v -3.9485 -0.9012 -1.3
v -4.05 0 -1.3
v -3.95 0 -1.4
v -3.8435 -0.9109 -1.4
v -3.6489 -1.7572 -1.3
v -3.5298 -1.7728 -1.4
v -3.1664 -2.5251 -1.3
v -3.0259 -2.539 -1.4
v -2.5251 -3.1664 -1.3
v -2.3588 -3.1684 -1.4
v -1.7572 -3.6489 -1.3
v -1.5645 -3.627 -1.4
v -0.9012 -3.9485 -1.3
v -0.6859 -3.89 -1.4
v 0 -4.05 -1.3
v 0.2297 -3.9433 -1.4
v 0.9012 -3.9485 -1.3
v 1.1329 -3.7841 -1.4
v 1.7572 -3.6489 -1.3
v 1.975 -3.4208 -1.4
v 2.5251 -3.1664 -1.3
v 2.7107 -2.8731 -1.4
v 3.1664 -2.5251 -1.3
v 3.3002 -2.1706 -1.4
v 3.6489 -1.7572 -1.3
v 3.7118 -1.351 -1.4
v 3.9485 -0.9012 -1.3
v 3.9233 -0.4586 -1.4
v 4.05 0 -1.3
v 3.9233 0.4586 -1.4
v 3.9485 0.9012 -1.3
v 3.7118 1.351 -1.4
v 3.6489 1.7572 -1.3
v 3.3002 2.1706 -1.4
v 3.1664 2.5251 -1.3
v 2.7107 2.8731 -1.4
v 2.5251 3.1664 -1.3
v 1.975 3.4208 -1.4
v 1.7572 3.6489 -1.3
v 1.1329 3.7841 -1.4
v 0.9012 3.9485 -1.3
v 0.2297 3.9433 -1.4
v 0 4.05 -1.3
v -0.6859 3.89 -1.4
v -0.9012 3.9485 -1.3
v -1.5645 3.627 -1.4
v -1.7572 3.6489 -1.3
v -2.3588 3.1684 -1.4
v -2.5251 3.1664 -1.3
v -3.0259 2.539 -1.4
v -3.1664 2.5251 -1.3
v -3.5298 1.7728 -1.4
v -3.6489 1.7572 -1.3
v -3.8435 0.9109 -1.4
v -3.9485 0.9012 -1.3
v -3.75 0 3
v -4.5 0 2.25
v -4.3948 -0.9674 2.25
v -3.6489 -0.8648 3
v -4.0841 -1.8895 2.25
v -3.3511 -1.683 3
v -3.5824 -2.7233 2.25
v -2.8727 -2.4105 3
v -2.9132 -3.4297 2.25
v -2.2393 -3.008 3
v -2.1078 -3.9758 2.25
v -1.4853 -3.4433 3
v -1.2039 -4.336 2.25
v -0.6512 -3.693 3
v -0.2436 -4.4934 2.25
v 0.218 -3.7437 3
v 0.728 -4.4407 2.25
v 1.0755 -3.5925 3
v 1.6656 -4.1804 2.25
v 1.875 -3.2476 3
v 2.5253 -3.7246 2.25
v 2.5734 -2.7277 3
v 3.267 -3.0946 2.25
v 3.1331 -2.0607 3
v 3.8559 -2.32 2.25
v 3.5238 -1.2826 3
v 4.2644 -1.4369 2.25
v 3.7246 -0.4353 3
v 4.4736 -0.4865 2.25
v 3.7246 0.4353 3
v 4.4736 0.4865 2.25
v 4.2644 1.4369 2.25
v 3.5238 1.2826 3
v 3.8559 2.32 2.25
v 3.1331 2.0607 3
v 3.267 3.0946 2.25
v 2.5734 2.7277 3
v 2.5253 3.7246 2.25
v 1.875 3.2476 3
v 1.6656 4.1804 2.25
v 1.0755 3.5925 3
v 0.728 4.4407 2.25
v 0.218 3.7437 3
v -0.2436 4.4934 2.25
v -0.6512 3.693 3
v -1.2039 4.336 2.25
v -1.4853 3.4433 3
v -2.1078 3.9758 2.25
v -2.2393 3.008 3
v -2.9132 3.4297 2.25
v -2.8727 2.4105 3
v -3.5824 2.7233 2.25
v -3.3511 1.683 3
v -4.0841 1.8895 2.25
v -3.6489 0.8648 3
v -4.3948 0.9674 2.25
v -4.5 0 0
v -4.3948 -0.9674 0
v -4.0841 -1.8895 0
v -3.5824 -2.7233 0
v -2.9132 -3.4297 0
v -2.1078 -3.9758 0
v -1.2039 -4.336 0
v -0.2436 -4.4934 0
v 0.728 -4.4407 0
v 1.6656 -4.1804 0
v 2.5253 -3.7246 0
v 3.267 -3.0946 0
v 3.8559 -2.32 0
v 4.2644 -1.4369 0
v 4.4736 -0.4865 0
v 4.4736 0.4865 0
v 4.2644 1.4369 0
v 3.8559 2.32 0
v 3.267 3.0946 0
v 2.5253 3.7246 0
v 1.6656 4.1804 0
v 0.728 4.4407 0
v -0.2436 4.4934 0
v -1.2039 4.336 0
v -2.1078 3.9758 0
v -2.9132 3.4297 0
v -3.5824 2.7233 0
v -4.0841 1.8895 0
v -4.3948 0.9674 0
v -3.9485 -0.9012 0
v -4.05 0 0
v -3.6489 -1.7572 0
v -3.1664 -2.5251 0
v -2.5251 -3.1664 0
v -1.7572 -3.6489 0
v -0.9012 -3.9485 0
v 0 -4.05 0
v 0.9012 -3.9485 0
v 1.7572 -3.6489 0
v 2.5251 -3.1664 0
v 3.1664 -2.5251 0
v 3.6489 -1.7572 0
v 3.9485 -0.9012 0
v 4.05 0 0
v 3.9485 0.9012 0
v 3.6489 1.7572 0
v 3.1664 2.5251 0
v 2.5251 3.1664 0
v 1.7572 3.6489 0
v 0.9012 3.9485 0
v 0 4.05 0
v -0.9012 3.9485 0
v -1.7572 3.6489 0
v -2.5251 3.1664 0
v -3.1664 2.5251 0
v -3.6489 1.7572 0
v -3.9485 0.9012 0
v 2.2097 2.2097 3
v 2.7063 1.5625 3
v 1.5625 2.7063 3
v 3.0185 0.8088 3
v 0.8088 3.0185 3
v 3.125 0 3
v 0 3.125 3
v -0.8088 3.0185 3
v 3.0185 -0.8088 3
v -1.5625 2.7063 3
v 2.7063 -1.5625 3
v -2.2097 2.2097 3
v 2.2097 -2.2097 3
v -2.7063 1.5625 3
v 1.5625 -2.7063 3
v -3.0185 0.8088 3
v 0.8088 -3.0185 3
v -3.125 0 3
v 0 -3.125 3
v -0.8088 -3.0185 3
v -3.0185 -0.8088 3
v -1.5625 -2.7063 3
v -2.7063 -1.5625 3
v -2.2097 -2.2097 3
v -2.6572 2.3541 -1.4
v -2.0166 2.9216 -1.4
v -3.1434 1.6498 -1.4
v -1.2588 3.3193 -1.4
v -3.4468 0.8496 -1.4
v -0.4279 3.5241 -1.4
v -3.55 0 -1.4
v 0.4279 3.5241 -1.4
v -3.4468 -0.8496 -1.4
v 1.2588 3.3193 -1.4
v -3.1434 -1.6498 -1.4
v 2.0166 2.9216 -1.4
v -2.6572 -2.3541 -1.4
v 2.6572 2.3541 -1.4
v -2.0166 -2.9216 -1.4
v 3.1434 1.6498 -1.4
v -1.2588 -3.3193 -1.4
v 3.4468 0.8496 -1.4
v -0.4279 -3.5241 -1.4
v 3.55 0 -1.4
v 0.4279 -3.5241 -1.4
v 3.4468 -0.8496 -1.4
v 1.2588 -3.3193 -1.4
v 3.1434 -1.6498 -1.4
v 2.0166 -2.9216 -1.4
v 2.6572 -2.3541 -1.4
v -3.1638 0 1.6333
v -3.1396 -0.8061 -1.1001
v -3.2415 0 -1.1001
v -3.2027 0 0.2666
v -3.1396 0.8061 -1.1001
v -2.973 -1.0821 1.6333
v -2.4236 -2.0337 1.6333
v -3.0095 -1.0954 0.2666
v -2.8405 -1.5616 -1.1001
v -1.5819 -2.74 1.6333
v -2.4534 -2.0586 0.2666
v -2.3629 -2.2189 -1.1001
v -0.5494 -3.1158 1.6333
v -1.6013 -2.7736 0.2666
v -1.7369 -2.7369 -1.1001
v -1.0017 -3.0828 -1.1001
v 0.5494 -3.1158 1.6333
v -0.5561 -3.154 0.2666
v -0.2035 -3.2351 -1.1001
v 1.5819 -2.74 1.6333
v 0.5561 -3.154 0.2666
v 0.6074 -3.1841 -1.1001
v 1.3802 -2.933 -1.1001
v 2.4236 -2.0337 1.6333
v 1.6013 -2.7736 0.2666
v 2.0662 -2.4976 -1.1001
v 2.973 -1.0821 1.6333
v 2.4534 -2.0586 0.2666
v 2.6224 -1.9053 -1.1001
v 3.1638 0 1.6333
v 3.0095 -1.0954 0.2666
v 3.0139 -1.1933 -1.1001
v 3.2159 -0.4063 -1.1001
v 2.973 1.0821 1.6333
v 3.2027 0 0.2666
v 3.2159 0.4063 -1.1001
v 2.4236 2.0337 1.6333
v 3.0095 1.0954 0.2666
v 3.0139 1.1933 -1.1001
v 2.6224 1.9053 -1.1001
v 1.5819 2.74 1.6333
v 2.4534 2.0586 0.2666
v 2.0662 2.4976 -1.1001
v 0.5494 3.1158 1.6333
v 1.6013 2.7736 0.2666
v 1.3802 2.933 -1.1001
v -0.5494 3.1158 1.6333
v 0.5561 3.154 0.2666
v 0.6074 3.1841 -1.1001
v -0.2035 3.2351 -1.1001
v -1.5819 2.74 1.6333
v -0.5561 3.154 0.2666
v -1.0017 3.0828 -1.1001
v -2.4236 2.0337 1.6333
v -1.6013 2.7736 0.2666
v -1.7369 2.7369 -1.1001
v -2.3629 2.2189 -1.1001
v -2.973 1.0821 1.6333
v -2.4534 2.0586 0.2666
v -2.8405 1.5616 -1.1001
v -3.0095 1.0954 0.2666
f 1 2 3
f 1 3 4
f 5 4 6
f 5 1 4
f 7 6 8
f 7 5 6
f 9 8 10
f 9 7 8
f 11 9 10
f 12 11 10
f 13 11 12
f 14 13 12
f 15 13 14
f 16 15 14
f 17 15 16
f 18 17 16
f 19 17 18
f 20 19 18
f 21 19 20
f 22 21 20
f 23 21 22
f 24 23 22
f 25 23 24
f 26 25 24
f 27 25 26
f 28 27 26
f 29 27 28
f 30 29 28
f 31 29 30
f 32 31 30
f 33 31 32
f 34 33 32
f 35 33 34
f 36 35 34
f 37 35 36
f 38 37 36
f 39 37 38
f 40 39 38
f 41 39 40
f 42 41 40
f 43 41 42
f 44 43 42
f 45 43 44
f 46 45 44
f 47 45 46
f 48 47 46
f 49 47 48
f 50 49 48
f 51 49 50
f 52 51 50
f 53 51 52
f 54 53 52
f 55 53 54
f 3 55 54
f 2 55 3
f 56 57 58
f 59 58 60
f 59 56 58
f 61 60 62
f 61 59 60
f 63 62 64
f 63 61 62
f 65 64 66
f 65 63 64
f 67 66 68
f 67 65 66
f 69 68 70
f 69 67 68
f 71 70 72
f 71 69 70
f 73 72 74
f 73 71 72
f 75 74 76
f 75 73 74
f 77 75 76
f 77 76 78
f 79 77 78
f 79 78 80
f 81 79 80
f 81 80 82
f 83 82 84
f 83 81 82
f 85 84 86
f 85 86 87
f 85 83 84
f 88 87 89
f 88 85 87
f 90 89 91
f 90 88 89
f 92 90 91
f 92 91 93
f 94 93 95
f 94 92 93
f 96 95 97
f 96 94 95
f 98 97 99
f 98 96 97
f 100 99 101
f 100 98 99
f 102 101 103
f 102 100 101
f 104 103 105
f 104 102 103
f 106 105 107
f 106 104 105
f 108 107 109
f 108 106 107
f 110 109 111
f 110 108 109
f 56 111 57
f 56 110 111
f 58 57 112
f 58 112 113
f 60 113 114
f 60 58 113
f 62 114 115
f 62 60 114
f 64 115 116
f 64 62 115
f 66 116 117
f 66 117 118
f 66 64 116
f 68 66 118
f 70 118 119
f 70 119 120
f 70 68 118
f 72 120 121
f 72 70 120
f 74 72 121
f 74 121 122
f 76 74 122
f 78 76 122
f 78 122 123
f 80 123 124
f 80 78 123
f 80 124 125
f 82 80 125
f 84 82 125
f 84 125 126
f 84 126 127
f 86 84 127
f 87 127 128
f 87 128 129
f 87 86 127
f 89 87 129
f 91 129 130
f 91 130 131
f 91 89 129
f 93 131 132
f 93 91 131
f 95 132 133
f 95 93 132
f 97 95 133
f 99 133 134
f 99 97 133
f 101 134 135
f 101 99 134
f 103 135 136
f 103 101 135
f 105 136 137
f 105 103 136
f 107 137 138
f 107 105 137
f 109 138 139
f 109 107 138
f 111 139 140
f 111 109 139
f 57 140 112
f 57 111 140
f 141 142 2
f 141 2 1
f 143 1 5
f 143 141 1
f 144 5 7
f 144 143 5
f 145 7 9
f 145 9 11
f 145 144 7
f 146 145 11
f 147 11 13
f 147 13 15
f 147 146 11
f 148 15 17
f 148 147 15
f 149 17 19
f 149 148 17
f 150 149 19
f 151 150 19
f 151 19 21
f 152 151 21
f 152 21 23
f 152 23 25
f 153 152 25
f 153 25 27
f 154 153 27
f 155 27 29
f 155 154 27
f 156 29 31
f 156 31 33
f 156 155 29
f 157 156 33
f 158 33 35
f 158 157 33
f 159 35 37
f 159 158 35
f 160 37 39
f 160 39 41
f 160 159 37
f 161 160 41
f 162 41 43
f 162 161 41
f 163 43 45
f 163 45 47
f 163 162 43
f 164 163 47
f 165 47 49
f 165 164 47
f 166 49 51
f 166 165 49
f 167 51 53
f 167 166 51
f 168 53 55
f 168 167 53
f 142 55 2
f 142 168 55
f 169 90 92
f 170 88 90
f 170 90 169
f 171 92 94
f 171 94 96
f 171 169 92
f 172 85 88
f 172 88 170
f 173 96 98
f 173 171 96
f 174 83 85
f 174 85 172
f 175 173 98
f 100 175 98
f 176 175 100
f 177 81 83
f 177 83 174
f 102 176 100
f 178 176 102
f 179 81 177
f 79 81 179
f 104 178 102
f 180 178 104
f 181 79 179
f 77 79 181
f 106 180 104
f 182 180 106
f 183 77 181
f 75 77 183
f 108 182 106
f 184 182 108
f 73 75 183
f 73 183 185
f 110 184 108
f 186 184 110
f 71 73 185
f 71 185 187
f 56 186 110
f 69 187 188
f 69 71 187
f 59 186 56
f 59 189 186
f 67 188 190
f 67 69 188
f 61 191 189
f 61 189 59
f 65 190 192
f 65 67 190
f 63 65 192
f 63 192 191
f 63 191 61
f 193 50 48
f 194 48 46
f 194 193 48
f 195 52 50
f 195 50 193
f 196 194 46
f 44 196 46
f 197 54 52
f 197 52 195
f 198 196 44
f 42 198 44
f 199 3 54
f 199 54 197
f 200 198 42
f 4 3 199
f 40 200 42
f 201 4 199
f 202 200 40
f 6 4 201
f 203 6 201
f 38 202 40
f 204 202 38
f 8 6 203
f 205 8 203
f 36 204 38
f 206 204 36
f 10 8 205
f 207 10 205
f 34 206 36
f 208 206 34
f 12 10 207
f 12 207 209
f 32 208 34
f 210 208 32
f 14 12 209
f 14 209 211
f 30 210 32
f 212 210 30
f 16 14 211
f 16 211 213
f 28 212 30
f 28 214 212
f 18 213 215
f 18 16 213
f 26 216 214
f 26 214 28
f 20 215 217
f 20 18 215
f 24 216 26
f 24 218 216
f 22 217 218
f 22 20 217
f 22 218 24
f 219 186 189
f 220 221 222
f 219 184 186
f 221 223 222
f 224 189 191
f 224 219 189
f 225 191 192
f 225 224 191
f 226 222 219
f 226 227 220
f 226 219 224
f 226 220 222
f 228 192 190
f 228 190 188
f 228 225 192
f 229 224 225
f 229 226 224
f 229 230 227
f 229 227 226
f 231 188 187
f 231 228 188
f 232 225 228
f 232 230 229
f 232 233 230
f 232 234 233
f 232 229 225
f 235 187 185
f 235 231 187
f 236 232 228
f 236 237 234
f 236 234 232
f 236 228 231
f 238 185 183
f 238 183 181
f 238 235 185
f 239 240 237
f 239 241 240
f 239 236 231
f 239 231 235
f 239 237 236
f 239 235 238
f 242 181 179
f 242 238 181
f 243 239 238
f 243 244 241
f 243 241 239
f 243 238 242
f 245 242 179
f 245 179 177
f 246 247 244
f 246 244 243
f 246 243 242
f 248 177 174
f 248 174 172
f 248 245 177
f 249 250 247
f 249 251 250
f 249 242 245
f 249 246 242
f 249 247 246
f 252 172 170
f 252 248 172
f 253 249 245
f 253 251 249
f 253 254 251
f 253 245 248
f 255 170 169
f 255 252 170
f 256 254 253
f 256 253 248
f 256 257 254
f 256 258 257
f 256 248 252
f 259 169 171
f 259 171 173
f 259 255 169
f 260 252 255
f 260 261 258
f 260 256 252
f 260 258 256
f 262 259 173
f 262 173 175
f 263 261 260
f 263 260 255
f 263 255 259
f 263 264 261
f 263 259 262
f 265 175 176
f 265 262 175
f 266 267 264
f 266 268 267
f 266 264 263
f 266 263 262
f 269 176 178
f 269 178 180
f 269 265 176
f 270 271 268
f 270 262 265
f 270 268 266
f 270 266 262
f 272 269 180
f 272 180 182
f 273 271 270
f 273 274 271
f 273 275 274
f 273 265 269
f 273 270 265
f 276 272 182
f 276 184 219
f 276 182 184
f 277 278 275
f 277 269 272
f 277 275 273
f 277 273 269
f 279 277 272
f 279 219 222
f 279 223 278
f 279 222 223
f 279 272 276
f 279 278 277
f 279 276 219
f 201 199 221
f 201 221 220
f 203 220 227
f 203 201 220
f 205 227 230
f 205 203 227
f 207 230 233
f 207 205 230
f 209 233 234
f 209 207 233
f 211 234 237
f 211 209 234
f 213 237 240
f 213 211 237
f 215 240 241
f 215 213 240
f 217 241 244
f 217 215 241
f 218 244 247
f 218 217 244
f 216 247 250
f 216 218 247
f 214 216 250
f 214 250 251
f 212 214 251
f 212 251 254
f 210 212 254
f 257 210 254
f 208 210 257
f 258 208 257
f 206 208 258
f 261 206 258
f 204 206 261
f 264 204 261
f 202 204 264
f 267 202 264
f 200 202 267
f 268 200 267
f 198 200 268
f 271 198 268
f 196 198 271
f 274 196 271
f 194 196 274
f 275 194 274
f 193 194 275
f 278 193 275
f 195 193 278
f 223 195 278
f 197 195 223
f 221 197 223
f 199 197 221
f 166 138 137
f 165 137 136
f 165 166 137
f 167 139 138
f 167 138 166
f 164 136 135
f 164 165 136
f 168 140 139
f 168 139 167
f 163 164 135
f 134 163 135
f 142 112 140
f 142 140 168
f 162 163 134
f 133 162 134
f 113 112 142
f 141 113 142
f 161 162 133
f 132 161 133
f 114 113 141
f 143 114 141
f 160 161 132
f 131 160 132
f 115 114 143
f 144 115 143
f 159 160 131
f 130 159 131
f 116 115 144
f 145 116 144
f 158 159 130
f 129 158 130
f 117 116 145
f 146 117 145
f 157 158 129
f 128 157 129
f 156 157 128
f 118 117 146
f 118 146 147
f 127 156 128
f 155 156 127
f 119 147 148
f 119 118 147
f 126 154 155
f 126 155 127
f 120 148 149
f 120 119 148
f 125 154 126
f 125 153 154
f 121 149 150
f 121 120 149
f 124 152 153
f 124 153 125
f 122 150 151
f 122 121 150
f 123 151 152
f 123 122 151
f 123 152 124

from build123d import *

# Parameters (mm, degrees)
CHAMFER_SIZE    = 0.75
CHAMFER001_SIZE = 0.3
CHAMFER002_SIZE = 0.1


with BuildPart() as part:
    # Sketch → Revolution (revolve)
    with BuildSketch(Plane.XZ):
        Polygon((-4.5, 0), (-4.5, 3), (-3.125, 3), (-3.25, -1.4), (-4.05, -1.4), (-4.05, 0), align=None)
    revolve(axis=Axis((0, 0, 0), (0, 0, 1)))

    # Chamfer
    chamfer_edges = [part.edges().sort_by_distance(p)[0] for p in [
        (4.5, 0, 3),
    ]]
    chamfer(chamfer_edges, length=CHAMFER_SIZE)

    # Chamfer001
    chamfer001_edges = [part.edges().sort_by_distance(p)[0] for p in [
        (3.25, 0, -1.4),
    ]]
    chamfer(chamfer001_edges, length=CHAMFER001_SIZE)

    # Chamfer002
    chamfer002_edges = [part.edges().sort_by_distance(p)[0] for p in [
        (4.05, 0, -1.4),
    ]]
    chamfer(chamfer002_edges, length=CHAMFER002_SIZE)


solid = part.part
